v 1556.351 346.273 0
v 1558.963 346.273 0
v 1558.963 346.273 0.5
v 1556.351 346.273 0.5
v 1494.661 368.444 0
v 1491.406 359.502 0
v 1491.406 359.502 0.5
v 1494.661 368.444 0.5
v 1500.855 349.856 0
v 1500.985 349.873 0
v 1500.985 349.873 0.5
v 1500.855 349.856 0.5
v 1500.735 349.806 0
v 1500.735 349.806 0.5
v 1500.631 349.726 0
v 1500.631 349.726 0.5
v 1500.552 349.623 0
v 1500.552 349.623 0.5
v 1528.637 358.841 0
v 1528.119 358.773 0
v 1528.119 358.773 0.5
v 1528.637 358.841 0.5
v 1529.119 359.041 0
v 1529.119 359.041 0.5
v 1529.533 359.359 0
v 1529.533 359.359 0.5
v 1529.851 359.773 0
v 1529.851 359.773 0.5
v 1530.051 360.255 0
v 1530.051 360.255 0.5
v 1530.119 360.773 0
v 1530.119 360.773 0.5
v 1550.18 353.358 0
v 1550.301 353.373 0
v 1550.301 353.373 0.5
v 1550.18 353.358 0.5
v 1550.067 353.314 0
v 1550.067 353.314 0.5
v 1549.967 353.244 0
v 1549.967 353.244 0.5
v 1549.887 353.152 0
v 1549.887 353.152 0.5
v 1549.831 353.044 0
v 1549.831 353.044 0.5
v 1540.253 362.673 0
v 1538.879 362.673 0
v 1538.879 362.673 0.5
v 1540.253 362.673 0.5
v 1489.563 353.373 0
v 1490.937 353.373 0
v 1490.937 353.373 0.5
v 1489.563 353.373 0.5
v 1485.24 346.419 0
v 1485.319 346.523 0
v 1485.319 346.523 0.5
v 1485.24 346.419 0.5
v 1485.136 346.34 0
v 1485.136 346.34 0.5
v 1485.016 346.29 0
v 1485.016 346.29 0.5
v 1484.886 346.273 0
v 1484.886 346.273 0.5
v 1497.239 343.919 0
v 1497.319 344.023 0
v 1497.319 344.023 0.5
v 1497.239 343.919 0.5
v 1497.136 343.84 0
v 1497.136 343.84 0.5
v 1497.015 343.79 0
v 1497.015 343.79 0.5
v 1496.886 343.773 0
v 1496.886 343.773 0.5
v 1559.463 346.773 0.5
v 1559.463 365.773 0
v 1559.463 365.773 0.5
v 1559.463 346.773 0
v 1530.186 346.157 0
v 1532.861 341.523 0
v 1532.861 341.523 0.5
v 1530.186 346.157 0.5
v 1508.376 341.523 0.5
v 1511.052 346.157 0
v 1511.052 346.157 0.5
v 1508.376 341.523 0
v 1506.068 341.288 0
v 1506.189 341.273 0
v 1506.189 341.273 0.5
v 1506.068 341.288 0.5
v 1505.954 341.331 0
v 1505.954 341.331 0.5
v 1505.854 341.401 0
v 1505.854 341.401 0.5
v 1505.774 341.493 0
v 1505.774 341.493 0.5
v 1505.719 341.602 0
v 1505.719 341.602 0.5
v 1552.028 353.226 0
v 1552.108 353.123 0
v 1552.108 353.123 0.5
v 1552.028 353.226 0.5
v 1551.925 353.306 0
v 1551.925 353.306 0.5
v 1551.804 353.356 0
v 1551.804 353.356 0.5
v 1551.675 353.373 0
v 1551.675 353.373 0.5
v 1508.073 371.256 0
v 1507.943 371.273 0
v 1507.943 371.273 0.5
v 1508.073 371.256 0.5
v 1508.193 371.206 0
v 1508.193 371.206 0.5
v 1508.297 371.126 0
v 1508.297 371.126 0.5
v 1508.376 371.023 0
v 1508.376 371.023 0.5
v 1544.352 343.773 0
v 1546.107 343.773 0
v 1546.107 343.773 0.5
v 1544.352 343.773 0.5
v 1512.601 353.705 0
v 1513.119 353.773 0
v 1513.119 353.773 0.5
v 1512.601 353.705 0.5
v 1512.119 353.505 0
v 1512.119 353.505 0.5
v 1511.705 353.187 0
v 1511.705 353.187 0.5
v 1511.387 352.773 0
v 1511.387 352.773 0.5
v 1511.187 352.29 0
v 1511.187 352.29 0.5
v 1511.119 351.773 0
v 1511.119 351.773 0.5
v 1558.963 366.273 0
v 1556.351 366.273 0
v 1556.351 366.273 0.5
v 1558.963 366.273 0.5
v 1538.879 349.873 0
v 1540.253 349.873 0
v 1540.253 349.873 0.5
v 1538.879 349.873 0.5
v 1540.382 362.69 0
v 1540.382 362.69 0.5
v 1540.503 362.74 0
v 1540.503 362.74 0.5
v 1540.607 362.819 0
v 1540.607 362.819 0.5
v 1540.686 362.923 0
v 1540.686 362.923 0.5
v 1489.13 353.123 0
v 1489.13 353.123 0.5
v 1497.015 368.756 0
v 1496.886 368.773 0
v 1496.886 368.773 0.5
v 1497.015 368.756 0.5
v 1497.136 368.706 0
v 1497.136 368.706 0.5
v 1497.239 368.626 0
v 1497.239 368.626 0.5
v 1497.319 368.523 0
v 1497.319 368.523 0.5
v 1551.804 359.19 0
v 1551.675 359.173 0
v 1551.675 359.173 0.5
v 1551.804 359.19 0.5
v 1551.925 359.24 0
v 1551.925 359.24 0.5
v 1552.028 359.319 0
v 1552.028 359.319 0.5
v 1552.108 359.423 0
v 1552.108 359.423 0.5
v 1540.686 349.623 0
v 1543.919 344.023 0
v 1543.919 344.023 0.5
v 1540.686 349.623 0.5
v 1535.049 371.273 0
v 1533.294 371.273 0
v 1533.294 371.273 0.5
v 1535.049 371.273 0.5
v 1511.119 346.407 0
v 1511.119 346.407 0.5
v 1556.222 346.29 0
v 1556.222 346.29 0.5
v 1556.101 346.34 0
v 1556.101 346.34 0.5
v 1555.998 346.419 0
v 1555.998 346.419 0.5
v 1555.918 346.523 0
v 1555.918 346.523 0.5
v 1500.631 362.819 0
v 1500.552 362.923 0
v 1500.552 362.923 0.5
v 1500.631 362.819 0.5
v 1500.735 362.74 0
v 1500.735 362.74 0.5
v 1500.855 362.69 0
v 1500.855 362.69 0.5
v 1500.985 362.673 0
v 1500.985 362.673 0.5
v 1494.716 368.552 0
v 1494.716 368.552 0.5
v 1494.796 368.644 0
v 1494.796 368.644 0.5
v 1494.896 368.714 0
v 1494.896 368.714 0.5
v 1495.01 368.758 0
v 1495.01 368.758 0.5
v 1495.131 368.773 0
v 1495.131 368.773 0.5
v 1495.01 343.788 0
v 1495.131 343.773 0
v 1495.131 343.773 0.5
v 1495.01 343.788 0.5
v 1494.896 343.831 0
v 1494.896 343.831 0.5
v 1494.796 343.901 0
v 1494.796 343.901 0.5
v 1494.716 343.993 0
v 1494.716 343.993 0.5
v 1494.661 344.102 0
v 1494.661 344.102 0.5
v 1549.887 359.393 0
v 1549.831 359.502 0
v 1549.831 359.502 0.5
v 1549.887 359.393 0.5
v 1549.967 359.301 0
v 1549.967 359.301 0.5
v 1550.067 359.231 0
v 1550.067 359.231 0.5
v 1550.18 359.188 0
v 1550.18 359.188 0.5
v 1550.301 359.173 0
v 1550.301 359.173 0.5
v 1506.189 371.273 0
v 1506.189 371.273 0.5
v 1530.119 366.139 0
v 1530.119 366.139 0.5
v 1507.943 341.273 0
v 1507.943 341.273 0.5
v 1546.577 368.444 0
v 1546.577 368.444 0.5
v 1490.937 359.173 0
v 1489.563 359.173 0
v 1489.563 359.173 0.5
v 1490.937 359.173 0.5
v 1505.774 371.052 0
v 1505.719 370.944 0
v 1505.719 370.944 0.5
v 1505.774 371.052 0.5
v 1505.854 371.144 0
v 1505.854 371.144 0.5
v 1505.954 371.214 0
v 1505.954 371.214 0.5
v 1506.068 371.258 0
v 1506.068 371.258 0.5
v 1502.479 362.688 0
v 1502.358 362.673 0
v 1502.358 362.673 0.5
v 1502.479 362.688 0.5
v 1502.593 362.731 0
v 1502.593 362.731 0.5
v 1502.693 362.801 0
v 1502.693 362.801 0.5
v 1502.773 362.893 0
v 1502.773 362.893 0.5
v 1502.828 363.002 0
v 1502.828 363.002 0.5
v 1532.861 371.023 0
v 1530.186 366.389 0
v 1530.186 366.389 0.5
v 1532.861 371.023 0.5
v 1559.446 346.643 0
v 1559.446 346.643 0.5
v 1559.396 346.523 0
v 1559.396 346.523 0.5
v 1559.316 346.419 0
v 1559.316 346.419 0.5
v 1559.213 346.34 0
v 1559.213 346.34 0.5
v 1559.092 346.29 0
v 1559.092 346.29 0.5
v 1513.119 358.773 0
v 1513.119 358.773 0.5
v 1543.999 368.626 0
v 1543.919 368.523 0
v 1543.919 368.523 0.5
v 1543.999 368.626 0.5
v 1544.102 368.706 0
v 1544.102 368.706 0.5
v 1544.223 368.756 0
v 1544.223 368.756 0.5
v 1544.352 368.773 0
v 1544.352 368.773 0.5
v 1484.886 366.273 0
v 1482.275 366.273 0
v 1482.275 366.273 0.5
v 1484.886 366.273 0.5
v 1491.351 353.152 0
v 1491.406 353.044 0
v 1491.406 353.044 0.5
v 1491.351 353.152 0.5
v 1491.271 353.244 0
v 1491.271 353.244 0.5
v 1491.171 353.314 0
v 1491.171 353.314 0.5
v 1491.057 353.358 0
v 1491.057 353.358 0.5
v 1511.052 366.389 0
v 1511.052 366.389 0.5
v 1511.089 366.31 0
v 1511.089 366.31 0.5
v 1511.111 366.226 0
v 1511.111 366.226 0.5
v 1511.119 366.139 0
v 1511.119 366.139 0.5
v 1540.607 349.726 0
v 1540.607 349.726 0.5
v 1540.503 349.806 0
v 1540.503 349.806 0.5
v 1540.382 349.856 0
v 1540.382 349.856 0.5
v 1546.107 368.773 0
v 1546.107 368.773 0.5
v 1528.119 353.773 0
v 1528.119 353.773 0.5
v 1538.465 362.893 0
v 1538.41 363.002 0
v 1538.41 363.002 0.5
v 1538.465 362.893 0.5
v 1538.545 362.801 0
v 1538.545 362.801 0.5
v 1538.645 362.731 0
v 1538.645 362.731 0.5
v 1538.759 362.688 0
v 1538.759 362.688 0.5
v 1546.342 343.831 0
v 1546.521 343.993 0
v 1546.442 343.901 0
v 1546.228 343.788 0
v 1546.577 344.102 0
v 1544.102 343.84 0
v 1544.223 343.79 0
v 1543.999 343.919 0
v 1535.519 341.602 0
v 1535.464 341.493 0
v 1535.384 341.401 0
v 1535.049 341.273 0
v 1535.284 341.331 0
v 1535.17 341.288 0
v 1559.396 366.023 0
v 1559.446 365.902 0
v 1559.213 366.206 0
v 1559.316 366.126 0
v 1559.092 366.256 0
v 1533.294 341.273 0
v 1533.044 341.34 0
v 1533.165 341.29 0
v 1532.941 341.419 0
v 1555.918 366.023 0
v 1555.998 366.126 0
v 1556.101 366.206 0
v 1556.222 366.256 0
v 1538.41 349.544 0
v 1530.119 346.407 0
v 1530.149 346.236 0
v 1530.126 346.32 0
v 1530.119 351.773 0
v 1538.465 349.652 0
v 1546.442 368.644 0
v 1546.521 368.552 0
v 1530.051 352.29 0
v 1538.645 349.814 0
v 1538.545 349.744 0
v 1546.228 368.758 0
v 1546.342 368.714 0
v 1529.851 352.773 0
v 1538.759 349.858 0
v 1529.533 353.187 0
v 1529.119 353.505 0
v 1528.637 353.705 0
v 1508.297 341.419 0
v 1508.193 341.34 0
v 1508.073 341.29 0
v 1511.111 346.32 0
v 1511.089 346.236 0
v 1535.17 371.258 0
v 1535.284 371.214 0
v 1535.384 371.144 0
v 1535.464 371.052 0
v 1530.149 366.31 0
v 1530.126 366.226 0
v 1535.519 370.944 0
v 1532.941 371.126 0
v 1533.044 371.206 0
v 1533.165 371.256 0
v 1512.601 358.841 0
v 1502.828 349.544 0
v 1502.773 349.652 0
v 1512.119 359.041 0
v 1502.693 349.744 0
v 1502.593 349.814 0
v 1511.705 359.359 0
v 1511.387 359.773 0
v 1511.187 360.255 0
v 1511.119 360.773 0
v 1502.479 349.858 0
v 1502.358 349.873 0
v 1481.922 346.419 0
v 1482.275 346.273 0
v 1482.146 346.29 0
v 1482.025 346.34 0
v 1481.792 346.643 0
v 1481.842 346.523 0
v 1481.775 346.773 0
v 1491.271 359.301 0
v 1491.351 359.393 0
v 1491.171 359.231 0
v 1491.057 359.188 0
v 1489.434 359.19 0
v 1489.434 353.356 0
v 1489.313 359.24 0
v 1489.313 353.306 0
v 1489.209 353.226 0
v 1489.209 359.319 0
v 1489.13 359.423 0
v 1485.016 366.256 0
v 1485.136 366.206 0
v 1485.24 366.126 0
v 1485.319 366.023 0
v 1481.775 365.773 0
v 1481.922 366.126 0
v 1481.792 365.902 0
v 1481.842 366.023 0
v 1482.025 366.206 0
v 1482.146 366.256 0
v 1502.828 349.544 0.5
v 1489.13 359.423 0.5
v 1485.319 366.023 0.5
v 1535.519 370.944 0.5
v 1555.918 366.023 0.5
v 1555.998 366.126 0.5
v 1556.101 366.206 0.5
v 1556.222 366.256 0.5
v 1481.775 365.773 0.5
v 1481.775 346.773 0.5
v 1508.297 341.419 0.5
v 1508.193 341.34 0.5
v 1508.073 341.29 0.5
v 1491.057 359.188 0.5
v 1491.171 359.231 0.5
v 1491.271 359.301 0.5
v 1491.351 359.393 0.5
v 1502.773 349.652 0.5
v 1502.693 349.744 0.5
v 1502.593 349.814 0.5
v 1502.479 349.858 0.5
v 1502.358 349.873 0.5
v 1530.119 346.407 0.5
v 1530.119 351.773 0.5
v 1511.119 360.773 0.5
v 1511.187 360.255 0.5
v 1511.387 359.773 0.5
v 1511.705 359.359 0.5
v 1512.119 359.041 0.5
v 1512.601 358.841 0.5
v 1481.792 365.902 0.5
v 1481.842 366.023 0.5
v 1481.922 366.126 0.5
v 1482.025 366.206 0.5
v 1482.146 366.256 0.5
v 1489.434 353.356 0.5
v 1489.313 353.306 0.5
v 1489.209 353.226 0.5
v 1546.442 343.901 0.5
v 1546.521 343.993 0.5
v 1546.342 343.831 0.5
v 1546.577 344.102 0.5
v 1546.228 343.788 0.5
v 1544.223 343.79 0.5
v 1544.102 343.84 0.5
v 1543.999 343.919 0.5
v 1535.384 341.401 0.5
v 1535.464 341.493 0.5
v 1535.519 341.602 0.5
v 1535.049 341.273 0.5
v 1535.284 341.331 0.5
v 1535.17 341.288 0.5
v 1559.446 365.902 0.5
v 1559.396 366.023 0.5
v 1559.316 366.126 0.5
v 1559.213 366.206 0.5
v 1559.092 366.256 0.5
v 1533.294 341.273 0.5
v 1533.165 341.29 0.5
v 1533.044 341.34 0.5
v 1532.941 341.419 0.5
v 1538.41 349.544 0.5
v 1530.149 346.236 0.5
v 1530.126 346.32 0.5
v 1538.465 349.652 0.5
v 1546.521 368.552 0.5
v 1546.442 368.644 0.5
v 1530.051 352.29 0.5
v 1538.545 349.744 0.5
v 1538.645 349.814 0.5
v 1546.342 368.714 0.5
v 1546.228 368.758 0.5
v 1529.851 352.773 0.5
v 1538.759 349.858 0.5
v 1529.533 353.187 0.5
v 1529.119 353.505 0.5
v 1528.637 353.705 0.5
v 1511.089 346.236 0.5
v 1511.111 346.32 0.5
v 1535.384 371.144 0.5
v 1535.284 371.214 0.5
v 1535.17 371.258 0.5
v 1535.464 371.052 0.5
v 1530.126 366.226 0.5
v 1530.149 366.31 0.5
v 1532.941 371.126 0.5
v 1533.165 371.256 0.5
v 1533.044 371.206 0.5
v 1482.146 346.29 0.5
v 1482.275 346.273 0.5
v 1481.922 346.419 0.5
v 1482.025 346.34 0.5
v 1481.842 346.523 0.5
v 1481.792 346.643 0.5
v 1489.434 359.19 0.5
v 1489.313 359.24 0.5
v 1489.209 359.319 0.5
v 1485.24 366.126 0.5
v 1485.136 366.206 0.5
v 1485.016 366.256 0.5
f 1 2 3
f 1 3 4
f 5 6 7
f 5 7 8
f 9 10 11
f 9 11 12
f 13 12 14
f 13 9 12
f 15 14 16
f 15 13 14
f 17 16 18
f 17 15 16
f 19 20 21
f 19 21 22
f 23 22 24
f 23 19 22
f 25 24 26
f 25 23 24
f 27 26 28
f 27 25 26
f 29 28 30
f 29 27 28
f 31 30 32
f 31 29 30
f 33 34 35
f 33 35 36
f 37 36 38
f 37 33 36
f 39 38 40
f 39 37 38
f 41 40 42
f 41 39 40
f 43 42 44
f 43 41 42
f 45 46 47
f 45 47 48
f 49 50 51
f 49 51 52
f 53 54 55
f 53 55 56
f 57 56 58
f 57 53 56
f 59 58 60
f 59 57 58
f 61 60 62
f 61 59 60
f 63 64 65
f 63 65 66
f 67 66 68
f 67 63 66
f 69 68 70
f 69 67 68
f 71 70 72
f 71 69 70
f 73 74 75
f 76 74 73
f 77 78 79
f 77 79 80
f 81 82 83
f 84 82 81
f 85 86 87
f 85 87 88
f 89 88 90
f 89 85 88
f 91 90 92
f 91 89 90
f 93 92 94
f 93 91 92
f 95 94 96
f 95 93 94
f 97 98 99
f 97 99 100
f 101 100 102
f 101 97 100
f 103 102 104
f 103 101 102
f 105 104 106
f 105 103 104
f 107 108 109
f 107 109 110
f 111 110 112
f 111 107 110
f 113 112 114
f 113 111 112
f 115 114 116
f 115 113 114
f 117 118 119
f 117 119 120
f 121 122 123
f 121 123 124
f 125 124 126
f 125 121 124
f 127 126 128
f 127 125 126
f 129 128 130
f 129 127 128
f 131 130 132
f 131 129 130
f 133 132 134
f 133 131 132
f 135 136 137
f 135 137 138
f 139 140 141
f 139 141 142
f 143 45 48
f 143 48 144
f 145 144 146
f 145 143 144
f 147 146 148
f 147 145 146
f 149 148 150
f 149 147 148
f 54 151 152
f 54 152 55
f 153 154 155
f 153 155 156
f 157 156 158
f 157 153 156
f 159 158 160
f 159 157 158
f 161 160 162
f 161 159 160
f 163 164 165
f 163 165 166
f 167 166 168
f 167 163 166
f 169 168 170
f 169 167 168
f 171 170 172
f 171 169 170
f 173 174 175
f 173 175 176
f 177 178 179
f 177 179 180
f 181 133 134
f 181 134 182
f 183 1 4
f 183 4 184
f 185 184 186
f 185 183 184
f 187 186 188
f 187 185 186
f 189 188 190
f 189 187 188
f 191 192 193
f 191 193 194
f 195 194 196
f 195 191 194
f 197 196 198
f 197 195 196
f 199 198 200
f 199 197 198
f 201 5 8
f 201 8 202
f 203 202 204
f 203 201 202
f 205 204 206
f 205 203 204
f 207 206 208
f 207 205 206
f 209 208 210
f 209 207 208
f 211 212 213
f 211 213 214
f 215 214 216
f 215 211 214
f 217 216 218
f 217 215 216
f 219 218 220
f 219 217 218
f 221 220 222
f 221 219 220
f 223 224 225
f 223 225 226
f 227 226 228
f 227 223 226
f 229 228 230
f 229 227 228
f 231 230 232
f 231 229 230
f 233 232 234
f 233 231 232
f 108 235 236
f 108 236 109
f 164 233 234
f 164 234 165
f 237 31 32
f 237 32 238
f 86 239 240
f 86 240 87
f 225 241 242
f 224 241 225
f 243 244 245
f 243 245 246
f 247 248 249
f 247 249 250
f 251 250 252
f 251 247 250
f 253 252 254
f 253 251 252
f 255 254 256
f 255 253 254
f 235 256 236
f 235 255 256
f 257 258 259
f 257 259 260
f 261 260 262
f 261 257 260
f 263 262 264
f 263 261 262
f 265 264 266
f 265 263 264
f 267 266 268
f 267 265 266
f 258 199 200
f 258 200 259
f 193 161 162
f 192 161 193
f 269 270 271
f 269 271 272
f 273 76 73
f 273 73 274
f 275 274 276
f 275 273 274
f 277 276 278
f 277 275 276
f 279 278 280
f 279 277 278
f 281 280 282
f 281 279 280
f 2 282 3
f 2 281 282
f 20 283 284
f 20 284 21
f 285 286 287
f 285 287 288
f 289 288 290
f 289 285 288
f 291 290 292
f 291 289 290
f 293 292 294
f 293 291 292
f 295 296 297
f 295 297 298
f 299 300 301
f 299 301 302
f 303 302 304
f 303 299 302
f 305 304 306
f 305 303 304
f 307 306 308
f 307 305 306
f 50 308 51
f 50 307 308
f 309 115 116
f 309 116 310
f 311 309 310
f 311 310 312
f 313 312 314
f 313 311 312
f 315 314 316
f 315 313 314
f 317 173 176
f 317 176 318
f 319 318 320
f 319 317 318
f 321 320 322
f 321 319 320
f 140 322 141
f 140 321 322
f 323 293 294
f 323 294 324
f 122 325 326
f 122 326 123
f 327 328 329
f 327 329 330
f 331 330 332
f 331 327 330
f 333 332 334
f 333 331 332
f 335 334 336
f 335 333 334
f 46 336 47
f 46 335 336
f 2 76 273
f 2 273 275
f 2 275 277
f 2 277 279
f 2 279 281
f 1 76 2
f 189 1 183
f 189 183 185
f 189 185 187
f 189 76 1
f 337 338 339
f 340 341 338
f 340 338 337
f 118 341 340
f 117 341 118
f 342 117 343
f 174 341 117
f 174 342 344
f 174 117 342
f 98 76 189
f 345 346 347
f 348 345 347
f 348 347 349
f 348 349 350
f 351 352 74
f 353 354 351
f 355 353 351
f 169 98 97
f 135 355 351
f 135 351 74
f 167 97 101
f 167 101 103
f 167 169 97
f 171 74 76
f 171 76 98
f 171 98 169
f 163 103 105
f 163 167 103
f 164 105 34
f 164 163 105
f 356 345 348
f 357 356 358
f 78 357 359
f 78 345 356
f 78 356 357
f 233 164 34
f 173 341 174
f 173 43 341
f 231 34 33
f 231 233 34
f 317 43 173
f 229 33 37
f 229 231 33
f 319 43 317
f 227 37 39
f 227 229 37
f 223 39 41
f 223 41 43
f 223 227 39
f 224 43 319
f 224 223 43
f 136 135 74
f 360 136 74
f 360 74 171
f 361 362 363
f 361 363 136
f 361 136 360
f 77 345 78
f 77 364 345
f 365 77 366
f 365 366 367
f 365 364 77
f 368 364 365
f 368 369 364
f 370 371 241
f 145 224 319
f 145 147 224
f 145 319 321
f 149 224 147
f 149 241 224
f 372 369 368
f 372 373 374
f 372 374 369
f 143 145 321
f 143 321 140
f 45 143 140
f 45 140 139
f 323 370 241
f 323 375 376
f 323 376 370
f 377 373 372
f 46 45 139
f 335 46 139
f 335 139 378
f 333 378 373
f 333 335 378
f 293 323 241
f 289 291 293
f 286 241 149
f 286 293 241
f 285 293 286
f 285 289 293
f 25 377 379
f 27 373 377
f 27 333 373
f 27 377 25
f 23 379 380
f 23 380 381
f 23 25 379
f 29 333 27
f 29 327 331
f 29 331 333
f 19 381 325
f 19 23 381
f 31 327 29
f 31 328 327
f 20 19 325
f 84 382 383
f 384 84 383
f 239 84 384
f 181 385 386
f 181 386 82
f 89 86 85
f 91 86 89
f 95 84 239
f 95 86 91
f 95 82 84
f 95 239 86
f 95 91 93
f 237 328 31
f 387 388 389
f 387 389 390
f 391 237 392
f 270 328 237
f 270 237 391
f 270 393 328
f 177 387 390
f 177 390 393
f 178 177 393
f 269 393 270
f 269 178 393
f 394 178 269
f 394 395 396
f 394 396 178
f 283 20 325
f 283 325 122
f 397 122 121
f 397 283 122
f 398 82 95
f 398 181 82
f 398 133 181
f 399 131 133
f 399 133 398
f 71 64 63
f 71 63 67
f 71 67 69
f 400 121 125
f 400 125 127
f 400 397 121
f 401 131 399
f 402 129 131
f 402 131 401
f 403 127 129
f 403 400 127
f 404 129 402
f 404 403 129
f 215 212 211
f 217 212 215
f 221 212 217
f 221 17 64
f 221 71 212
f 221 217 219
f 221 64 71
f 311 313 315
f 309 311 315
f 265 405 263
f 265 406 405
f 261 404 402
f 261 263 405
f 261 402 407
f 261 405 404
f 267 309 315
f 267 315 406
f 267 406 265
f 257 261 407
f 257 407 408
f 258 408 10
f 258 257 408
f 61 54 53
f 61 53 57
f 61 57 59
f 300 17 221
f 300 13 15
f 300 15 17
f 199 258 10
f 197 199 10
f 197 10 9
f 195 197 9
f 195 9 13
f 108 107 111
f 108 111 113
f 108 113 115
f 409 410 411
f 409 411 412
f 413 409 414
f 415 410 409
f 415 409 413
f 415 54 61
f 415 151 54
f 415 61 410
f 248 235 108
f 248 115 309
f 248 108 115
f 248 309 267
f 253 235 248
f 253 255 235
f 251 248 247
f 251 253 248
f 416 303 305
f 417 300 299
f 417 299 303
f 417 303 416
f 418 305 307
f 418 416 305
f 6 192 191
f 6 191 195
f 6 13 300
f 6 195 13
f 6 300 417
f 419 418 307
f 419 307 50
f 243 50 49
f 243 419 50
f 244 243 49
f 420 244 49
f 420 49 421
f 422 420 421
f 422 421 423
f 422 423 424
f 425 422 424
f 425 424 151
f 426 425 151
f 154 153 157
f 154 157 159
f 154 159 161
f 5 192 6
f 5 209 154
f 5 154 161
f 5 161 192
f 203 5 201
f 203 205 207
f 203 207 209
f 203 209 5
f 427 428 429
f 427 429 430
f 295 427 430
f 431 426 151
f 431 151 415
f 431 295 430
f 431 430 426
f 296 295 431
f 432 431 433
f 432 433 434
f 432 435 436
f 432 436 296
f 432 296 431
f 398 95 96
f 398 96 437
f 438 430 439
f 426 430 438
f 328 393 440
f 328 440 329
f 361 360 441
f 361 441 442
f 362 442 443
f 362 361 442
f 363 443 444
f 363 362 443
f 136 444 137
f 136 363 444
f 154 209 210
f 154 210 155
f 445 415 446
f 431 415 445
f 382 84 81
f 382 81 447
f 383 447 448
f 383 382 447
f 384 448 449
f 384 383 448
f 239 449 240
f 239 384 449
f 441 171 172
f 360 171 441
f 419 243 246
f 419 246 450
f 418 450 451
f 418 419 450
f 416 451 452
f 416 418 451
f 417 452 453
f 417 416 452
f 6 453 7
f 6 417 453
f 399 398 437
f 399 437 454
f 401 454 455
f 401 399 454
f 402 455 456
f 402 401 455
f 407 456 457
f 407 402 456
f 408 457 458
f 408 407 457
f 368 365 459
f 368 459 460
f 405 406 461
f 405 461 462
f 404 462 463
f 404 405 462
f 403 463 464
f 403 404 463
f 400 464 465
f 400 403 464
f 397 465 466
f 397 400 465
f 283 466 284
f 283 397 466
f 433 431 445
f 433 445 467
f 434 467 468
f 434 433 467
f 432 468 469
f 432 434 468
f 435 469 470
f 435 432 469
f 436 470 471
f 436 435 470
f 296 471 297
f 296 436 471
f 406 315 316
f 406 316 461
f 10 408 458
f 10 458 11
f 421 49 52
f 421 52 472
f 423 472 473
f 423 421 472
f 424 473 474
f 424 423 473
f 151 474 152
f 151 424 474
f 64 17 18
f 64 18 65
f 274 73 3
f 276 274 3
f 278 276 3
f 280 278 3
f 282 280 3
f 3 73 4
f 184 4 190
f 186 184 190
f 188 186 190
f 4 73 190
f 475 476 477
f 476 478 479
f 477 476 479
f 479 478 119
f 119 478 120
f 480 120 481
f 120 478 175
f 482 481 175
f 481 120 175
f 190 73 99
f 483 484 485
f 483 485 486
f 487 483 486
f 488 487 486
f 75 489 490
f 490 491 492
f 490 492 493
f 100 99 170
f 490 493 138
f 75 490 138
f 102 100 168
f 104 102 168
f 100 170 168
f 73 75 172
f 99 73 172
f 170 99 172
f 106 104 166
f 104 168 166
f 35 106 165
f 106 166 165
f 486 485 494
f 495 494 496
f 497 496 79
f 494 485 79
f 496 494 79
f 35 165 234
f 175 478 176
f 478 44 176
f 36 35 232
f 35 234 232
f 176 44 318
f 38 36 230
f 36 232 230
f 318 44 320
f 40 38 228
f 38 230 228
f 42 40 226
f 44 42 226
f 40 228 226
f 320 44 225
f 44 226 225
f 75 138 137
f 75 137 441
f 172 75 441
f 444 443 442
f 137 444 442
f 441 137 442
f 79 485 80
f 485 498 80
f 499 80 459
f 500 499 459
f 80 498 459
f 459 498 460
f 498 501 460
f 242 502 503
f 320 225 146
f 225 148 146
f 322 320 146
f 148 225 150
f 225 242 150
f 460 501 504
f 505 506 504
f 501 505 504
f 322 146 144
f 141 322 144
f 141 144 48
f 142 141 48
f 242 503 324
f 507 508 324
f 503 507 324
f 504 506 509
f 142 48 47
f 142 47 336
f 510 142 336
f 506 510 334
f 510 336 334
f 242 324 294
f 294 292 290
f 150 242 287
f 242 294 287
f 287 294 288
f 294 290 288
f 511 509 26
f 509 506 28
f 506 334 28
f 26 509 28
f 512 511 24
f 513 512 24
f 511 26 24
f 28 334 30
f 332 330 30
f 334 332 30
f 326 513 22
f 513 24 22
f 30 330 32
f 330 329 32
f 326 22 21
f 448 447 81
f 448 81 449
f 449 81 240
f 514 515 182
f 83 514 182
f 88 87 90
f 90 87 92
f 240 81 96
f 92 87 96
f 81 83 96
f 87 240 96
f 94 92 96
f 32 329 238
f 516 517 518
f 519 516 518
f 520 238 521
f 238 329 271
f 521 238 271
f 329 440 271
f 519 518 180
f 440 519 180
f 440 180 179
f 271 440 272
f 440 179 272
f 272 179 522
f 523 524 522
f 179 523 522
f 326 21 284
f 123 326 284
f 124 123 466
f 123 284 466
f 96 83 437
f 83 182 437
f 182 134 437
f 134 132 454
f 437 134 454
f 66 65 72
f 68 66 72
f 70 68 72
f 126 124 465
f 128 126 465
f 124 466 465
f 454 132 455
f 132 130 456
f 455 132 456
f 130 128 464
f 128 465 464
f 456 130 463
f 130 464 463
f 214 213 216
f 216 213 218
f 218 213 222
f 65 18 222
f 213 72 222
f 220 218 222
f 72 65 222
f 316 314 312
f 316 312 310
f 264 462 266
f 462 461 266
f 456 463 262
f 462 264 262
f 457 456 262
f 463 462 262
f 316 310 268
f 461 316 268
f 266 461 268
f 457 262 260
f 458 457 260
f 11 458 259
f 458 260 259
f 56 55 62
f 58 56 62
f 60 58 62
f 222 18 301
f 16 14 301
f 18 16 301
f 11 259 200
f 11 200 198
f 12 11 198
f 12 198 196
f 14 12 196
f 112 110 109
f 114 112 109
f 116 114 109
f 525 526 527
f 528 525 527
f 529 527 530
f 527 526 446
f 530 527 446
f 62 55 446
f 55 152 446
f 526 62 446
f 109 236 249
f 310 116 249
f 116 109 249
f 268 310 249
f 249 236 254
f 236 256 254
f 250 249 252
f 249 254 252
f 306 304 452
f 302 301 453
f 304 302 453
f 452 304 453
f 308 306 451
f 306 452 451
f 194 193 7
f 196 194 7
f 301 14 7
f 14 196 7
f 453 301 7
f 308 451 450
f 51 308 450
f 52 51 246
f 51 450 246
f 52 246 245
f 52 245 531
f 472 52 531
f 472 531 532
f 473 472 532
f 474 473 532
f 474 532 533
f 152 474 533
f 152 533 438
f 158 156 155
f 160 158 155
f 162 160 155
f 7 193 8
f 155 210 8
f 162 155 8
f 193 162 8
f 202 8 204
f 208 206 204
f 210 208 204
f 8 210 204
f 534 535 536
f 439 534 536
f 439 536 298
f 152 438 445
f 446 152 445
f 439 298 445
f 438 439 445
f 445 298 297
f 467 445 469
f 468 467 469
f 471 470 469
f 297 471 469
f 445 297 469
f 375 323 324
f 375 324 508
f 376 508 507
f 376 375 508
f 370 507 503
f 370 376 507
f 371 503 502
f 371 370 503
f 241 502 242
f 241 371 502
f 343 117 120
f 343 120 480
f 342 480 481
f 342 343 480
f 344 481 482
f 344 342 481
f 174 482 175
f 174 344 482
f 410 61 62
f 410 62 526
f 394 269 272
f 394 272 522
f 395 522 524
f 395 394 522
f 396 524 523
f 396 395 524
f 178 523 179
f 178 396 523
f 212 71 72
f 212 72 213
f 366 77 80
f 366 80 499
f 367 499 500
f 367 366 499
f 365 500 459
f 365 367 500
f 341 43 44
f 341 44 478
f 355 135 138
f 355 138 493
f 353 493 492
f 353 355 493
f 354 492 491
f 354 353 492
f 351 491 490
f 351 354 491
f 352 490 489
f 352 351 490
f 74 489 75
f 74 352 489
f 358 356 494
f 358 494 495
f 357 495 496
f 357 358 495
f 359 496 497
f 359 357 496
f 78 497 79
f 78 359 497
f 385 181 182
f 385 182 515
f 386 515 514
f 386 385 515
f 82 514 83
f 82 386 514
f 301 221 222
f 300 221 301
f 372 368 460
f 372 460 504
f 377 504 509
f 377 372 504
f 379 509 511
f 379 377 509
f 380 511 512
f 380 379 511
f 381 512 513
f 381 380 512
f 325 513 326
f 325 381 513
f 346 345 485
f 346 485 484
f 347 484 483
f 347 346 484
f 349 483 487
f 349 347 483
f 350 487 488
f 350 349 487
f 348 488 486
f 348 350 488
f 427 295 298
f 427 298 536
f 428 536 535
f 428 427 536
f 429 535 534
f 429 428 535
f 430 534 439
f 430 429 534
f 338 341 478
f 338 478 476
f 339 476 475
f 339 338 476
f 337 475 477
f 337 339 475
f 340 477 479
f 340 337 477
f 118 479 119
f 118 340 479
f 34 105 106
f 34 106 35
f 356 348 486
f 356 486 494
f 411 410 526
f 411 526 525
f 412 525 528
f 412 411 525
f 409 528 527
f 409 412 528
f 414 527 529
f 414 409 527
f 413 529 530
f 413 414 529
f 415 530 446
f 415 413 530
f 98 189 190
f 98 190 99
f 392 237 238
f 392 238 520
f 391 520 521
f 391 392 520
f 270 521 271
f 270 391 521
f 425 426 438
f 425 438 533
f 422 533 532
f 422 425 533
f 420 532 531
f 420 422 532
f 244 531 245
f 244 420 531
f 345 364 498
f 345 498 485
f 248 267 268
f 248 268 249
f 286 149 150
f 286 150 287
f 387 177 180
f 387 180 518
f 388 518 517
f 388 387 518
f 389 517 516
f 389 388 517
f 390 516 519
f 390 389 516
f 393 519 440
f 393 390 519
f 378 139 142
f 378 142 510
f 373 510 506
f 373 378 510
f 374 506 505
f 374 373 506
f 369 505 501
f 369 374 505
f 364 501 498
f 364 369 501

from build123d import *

# Parameters (mm, degrees)
BOSS_EXTRUDE1_DEPTH = 0.5


with BuildPart() as part:
    # Model → Boss-Extrude1 (new body)
    with BuildSketch(Plane.XY):
        with BuildLine():
            Line((1535.049130397, 341.272822748), (1533.294327078, 341.272822748))
            ThreePointArc((1533.294327078, 341.272822748), (1533.044327078, 341.339810046), (1532.861314376, 341.522822748))
            Line((1532.861314376, 341.522822748), (1530.185887896, 346.156797344))
            ThreePointArc((1530.185887896, 346.156797344), (1530.135937685, 346.277387821), (1530.118900598, 346.406797344))
            Line((1530.118900598, 346.406797344), (1530.118900598, 351.772822748))
            ThreePointArc((1530.118900598, 351.772822748), (1529.53311416, 353.18703631), (1528.118900598, 353.772822748))
            Line((1528.118900598, 353.772822748), (1513.118900598, 353.772822748))
            ThreePointArc((1513.118900598, 353.772822748), (1511.704687035, 353.18703631), (1511.118900598, 351.772822748))
            Line((1511.118900598, 351.772822748), (1511.118900598, 346.406797344))
            ThreePointArc((1511.118900598, 346.406797344), (1511.101863511, 346.277387821), (1511.0519133, 346.156797344))
            Line((1511.0519133, 346.156797344), (1508.376486819, 341.522822748))
            ThreePointArc((1508.376486819, 341.522822748), (1508.193474117, 341.339810046), (1507.943474117, 341.272822748))
            Line((1507.943474117, 341.272822748), (1506.188670798, 341.272822748))
            ThreePointArc((1506.188670798, 341.272822748), (1505.90188258, 341.363246725), (1505.718824488, 341.601812676))
            Line((1505.718824488, 341.601812676), (1502.828165556, 349.543832819))
            ThreePointArc((1502.828165556, 349.543832819), (1502.645107463, 349.78239877), (1502.358319245, 349.872822748))
            Line((1502.358319245, 349.872822748), (1500.984812422, 349.872822748))
            ThreePointArc((1500.984812422, 349.872822748), (1500.734812422, 349.805835449), (1500.55179972, 349.622822748))
            Line((1500.55179972, 349.622822748), (1497.318638213, 344.022822748))
            ThreePointArc((1497.318638213, 344.022822748), (1497.135625511, 343.839810046), (1496.885625511, 343.772822748))
            Line((1496.885625511, 343.772822748), (1495.130822192, 343.772822748))
            ThreePointArc((1495.130822192, 343.772822748), (1494.844033974, 343.863246725), (1494.660975881, 344.101812676))
            Line((1494.660975881, 344.101812676), (1491.406346715, 353.043832819))
            ThreePointArc((1491.406346715, 353.043832819), (1491.223288623, 353.28239877), (1490.936500405, 353.372822748))
            Line((1490.936500405, 353.372822748), (1489.562993581, 353.372822748))
            ThreePointArc((1489.562993581, 353.372822748), (1489.312993581, 353.305835449), (1489.129980879, 353.122822748))
            Line((1489.129980879, 353.122822748), (1485.319469103, 346.522822748))
            ThreePointArc((1485.319469103, 346.522822748), (1485.136456401, 346.339810046), (1484.886456401, 346.272822748))
            Line((1484.886456401, 346.272822748), (1482.275131536, 346.272822748))
            ThreePointArc((1482.275131536, 346.272822748), (1481.921578145, 346.419269357), (1481.775131536, 346.772822748))
            Line((1481.775131536, 346.772822748), (1481.775131536, 365.772822748))
            ThreePointArc((1481.775131536, 365.772822748), (1481.921578145, 366.126376138), (1482.275131536, 366.272822748))
            Line((1482.275131536, 366.272822748), (1484.886456401, 366.272822748))
            ThreePointArc((1484.886456401, 366.272822748), (1485.136456401, 366.205835449), (1485.319469103, 366.022822748))
            Line((1485.319469103, 366.022822748), (1489.129980879, 359.422822748))
            ThreePointArc((1489.129980879, 359.422822748), (1489.312993581, 359.239810046), (1489.562993581, 359.172822748))
            Line((1489.562993581, 359.172822748), (1490.936500405, 359.172822748))
            ThreePointArc((1490.936500405, 359.172822748), (1491.223288623, 359.263246725), (1491.406346715, 359.501812676))
            Line((1491.406346715, 359.501812676), (1494.660975881, 368.443832819))
            ThreePointArc((1494.660975881, 368.443832819), (1494.844033974, 368.68239877), (1495.130822192, 368.772822748))
            Line((1495.130822192, 368.772822748), (1496.885625511, 368.772822748))
            ThreePointArc((1496.885625511, 368.772822748), (1497.135625511, 368.705835449), (1497.318638213, 368.522822748))
            Line((1497.318638213, 368.522822748), (1500.55179972, 362.922822748))
            ThreePointArc((1500.55179972, 362.922822748), (1500.734812422, 362.739810046), (1500.984812422, 362.672822748))
            Line((1500.984812422, 362.672822748), (1502.358319245, 362.672822748))
            ThreePointArc((1502.358319245, 362.672822748), (1502.645107463, 362.763246725), (1502.828165556, 363.001812676))
            Line((1502.828165556, 363.001812676), (1505.718824488, 370.943832819))
            ThreePointArc((1505.718824488, 370.943832819), (1505.90188258, 371.18239877), (1506.188670798, 371.272822748))
            Line((1506.188670798, 371.272822748), (1507.943474117, 371.272822748))
            ThreePointArc((1507.943474117, 371.272822748), (1508.193474117, 371.205835449), (1508.376486819, 371.022822748))
            Line((1508.376486819, 371.022822748), (1511.0519133, 366.388848151))
            ThreePointArc((1511.0519133, 366.388848151), (1511.101863511, 366.268257674), (1511.118900598, 366.138848151))
            Line((1511.118900598, 366.138848151), (1511.118900598, 360.772822748))
            ThreePointArc((1511.118900598, 360.772822748), (1511.704687035, 359.358609185), (1513.118900598, 358.772822748))
            Line((1513.118900598, 358.772822748), (1528.118900598, 358.772822748))
            ThreePointArc((1528.118900598, 358.772822748), (1529.53311416, 359.358609185), (1530.118900598, 360.772822748))
            Line((1530.118900598, 360.772822748), (1530.118900598, 366.138848151))
            ThreePointArc((1530.118900598, 366.138848151), (1530.135937685, 366.268257674), (1530.185887896, 366.388848151))
            Line((1530.185887896, 366.388848151), (1532.861314376, 371.022822748))
            ThreePointArc((1532.861314376, 371.022822748), (1533.044327078, 371.205835449), (1533.294327078, 371.272822748))
            Line((1533.294327078, 371.272822748), (1535.049130397, 371.272822748))
            ThreePointArc((1535.049130397, 371.272822748), (1535.335918615, 371.18239877), (1535.518976708, 370.943832819))
            Line((1535.518976708, 370.943832819), (1538.40963564, 363.001812676))
            ThreePointArc((1538.40963564, 363.001812676), (1538.592693732, 362.763246725), (1538.87948195, 362.672822748))
            Line((1538.87948195, 362.672822748), (1540.252988773, 362.672822748))
            ThreePointArc((1540.252988773, 362.672822748), (1540.502988773, 362.739810046), (1540.686001475, 362.922822748))
            Line((1540.686001475, 362.922822748), (1543.919162983, 368.522822748))
            ThreePointArc((1543.919162983, 368.522822748), (1544.102175685, 368.705835449), (1544.352175685, 368.772822748))
            Line((1544.352175685, 368.772822748), (1546.106979004, 368.772822748))
            ThreePointArc((1546.106979004, 368.772822748), (1546.393767222, 368.68239877), (1546.576825314, 368.443832819))
            Line((1546.576825314, 368.443832819), (1549.831454481, 359.501812676))
            ThreePointArc((1549.831454481, 359.501812676), (1550.014512573, 359.263246725), (1550.301300791, 359.172822748))
            Line((1550.301300791, 359.172822748), (1551.674807614, 359.172822748))
            ThreePointArc((1551.674807614, 359.172822748), (1551.924807614, 359.239810046), (1552.107820316, 359.422822748))
            Line((1552.107820316, 359.422822748), (1555.918332093, 366.022822748))
            ThreePointArc((1555.918332093, 366.022822748), (1556.101344795, 366.205835449), (1556.351344795, 366.272822748))
            Line((1556.351344795, 366.272822748), (1558.96266966, 366.272822748))
            ThreePointArc((1558.96266966, 366.272822748), (1559.316223051, 366.126376138), (1559.46266966, 365.772822748))
            Line((1559.46266966, 365.772822748), (1559.46266966, 346.772822748))
            ThreePointArc((1559.46266966, 346.772822748), (1559.316223051, 346.419269357), (1558.96266966, 346.272822748))
            Line((1558.96266966, 346.272822748), (1556.351344795, 346.272822748))
            ThreePointArc((1556.351344795, 346.272822748), (1556.101344795, 346.339810046), (1555.918332093, 346.522822748))
            Line((1555.918332093, 346.522822748), (1552.107820316, 353.122822748))
            ThreePointArc((1552.107820316, 353.122822748), (1551.924807614, 353.305835449), (1551.674807614, 353.372822748))
            Line((1551.674807614, 353.372822748), (1550.301300791, 353.372822748))
            ThreePointArc((1550.301300791, 353.372822748), (1550.014512573, 353.28239877), (1549.831454481, 353.043832819))
            Line((1549.831454481, 353.043832819), (1546.576825314, 344.101812676))
            ThreePointArc((1546.576825314, 344.101812676), (1546.393767222, 343.863246725), (1546.106979004, 343.772822748))
            Line((1546.106979004, 343.772822748), (1544.352175685, 343.772822748))
            ThreePointArc((1544.352175685, 343.772822748), (1544.102175685, 343.839810046), (1543.919162983, 344.022822748))
            Line((1543.919162983, 344.022822748), (1540.686001475, 349.622822748))
            ThreePointArc((1540.686001475, 349.622822748), (1540.502988773, 349.805835449), (1540.252988773, 349.872822748))
            Line((1540.252988773, 349.872822748), (1538.87948195, 349.872822748))
            ThreePointArc((1538.87948195, 349.872822748), (1538.592693732, 349.78239877), (1538.40963564, 349.543832819))
            Line((1538.40963564, 349.543832819), (1535.518976708, 341.601812676))
            ThreePointArc((1535.518976708, 341.601812676), (1535.335918616, 341.363246725), (1535.049130397, 341.272822748))
        make_face()
    extrude(amount=BOSS_EXTRUDE1_DEPTH)


solid = part.part
